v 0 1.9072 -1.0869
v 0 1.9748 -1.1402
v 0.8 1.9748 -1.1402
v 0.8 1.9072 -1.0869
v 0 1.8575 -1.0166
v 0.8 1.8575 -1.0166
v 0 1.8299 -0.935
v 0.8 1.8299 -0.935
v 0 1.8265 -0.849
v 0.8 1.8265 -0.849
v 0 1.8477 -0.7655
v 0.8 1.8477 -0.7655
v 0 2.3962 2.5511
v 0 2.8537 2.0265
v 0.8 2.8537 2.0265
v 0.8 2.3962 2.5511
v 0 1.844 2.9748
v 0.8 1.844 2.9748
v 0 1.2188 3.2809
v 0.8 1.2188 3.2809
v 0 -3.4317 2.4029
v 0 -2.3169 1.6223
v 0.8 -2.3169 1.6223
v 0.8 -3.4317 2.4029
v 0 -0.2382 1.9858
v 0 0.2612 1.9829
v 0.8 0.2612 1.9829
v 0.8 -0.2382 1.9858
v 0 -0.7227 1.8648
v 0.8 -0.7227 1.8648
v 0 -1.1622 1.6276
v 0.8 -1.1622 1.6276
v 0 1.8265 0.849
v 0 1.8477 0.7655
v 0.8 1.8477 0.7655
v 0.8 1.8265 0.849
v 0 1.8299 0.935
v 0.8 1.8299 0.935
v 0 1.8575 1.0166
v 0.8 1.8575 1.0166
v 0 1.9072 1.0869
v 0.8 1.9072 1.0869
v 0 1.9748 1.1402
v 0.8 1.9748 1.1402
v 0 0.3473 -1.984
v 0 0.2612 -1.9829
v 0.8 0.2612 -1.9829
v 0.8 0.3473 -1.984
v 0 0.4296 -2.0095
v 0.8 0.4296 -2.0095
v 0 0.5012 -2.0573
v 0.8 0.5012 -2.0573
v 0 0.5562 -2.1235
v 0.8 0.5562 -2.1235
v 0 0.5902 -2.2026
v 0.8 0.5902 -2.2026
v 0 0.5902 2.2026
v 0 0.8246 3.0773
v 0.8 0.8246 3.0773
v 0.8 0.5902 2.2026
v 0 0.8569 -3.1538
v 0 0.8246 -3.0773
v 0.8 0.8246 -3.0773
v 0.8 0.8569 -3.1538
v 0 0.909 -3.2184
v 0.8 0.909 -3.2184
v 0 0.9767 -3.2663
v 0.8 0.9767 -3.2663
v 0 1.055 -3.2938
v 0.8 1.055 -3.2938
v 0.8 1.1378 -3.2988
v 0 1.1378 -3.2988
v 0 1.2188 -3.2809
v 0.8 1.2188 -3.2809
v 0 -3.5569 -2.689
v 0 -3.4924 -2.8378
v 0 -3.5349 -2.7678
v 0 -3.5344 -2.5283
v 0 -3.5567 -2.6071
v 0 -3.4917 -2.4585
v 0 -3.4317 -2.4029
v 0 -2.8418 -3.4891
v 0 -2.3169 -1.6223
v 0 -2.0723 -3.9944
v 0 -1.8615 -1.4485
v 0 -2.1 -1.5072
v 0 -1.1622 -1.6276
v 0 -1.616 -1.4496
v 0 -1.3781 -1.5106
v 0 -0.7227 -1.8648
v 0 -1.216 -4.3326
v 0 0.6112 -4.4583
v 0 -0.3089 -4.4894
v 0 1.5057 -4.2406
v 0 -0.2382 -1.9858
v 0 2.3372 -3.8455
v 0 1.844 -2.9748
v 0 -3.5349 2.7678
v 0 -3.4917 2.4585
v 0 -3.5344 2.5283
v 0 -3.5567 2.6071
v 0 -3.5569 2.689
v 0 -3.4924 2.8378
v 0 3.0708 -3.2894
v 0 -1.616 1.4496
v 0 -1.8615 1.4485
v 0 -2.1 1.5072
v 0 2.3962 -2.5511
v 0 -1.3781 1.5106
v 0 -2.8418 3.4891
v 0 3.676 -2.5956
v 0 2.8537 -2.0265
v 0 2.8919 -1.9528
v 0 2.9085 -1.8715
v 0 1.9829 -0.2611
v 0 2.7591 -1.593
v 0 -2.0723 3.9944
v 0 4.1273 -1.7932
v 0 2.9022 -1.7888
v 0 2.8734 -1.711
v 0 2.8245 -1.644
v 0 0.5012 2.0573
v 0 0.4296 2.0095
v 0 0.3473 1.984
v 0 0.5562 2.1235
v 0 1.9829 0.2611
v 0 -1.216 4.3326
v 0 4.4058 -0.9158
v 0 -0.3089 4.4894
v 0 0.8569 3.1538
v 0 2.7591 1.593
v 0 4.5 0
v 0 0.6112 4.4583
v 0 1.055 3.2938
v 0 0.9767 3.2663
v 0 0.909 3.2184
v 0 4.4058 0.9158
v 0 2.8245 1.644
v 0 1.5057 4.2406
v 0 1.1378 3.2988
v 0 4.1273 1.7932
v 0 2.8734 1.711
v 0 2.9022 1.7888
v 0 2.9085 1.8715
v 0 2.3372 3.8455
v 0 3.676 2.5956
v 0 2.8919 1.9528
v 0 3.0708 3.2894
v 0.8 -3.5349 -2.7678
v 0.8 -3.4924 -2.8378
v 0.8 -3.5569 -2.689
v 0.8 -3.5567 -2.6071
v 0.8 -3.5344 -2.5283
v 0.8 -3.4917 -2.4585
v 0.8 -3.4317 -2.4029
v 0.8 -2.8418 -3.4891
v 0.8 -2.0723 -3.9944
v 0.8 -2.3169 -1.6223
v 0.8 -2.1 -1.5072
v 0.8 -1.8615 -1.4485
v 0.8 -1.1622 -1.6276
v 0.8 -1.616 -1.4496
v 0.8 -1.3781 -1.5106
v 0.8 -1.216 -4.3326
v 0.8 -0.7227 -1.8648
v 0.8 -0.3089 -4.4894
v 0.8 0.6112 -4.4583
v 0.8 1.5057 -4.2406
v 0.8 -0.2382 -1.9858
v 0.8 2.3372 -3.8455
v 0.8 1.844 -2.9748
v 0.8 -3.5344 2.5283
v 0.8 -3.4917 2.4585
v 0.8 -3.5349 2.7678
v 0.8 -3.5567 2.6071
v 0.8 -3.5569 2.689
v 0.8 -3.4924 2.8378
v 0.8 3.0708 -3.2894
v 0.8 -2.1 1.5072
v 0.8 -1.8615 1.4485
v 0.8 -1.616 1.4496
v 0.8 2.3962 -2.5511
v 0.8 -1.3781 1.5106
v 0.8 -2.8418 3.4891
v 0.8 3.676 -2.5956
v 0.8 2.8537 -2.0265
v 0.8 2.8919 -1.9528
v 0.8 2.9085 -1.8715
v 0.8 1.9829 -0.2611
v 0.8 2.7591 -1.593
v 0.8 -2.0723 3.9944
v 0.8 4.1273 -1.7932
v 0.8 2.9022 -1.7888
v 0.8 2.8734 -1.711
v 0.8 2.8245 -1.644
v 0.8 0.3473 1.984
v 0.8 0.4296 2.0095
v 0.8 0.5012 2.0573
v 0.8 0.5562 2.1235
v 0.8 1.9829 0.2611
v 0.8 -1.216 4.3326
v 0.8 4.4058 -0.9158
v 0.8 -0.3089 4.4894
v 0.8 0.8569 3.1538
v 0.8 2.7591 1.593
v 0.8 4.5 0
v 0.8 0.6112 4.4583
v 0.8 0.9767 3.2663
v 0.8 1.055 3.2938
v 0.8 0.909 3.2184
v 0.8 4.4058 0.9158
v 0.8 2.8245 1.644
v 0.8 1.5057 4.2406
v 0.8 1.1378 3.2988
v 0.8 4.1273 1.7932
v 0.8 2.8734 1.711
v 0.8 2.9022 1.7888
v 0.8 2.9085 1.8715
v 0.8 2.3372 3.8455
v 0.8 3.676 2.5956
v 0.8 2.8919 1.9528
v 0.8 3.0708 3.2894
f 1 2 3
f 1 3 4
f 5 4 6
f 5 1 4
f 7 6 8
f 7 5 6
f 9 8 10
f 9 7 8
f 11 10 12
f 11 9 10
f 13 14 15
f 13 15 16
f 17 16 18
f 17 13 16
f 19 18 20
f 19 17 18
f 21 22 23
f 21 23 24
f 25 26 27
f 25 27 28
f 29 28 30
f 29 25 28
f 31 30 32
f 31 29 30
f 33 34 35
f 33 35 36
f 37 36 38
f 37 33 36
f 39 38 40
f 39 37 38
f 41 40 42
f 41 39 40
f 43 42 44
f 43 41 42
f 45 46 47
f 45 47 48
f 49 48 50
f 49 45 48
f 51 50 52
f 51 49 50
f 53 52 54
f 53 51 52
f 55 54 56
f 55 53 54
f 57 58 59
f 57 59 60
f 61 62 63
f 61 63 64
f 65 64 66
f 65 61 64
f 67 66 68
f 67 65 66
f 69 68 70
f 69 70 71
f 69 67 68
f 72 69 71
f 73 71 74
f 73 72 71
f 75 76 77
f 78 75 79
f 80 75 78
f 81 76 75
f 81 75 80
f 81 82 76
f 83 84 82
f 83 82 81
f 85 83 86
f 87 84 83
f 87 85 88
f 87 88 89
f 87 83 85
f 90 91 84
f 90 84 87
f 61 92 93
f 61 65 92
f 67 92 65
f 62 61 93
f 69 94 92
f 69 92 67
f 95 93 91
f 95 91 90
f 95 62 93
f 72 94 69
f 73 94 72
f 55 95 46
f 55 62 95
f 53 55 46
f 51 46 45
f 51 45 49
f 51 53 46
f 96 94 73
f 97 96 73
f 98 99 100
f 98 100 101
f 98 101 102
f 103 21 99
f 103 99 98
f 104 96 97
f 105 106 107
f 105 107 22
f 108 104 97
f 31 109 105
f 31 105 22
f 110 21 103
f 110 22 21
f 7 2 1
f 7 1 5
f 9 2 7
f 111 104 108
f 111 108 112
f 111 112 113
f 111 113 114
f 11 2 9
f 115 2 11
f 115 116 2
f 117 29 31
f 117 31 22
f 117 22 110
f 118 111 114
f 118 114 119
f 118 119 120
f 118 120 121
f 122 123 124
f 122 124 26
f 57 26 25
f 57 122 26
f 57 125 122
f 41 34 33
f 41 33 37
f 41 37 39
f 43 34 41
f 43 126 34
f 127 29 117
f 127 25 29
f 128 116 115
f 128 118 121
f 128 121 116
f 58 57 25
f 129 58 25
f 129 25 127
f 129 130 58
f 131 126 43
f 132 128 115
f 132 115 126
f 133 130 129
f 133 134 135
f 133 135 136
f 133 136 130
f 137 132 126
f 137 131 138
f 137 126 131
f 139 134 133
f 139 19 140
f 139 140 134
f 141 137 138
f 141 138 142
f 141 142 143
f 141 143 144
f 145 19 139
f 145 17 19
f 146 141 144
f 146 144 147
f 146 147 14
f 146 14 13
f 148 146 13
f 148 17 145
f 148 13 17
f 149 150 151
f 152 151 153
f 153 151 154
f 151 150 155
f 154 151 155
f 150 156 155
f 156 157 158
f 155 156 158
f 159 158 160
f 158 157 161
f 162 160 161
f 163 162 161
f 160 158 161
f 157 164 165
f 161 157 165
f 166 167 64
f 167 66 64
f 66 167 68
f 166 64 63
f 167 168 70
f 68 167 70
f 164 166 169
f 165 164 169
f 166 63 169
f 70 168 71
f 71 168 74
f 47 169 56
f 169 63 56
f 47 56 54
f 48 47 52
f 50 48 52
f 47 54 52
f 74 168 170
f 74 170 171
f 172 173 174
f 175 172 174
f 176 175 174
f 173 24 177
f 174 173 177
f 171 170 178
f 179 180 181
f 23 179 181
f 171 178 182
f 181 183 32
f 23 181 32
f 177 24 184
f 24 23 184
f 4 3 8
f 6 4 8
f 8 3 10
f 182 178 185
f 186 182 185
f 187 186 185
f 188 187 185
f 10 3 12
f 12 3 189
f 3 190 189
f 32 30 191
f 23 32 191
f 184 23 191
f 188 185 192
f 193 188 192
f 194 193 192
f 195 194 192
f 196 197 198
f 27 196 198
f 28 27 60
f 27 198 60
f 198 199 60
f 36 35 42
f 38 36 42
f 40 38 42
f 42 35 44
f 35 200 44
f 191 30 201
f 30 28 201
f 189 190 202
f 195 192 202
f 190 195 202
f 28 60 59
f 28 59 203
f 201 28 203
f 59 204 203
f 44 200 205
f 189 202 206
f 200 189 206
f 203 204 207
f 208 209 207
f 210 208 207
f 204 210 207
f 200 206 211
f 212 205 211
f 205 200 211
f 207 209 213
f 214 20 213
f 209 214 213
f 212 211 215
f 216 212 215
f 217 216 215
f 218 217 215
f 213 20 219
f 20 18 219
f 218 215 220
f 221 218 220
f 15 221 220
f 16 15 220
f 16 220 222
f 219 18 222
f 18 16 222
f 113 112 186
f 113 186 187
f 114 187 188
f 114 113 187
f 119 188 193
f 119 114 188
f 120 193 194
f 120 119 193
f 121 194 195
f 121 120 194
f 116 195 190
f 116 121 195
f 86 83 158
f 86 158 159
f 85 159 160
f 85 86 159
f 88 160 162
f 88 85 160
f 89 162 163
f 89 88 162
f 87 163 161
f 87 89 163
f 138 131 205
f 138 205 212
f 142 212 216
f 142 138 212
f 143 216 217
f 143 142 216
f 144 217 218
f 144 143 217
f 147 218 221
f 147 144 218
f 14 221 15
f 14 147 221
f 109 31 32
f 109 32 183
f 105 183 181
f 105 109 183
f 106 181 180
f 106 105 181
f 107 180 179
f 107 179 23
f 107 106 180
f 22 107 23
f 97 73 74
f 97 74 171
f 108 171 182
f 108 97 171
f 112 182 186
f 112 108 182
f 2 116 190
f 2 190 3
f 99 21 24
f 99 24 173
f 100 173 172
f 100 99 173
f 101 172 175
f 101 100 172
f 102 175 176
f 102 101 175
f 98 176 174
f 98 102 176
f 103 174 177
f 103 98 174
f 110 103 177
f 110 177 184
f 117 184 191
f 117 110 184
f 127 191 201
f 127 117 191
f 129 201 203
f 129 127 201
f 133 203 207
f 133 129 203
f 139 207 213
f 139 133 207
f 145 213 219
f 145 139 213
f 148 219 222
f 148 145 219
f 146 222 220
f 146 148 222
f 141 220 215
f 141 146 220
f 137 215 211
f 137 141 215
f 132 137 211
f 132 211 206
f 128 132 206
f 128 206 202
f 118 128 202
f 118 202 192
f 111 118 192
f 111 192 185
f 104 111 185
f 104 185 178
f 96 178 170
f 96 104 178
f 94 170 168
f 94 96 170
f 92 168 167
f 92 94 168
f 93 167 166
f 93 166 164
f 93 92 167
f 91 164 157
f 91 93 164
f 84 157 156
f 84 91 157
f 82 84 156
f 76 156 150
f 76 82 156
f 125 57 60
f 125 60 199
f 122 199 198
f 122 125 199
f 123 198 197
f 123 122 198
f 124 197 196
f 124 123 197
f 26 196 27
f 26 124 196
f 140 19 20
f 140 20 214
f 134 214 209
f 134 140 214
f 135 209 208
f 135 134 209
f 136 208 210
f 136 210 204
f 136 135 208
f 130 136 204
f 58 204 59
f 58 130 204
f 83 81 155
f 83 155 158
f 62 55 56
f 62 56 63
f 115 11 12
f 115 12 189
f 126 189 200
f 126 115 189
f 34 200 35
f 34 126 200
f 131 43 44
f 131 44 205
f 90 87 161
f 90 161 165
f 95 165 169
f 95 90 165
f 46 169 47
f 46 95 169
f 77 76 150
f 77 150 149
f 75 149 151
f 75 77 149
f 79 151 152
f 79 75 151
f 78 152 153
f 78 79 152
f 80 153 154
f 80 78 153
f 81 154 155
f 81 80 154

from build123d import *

# Parameters (mm, degrees)
EXTRUDE_1_DEPTH = 0.8


with BuildPart() as part:
    # 草图1 → 凸台-拉伸1 (new body)
    with BuildSketch(Plane(origin=(0, 0, 0), x_dir=(0, 0, -1), z_dir=(1, 0, 0))):
        with BuildLine():
            Line((-1.622319151, -2.316911861), (-2.402867712, -3.431650734))
            ThreePointArc((-2.402867712, -3.431650734), (-2.607110405, -3.556693113), (-2.837799992, -3.492404789))
            ThreePointArc((-2.837799992, -3.492404789), (0, 4.5), (2.837799992, -3.492404789))
            ThreePointArc((2.837799992, -3.492404789), (2.607110405, -3.556693113), (2.402867712, -3.431650734))
            Line((2.402867712, -3.431650734), (1.622319151, -2.316911861))
            ThreePointArc((1.622319151, -2.316911861), (1.441481842, -1.738720971), (1.627647463, -1.162223617))
            ThreePointArc((1.627647463, -1.162223617), (1.9404922, -0.484241696), (1.982865646, 0.261235201))
            ThreePointArc((1.982865646, 0.261235201), (2.030846926, 0.467080052), (2.202649779, 0.59019823))
            Line((2.202649779, 0.59019823), (3.077349334, 0.824573269))
            ThreePointArc((3.077349334, 0.824573269), (3.266264026, 0.97670818), (3.280925835, 1.218821425))
            ThreePointArc((3.280925835, 1.218821425), (2.776736691, 2.130665002), (2.026457183, 2.853676801))
            ThreePointArc((2.026457183, 2.853676801), (1.788798992, 2.902178099), (1.592953232, 2.759075932))
            Line((1.592953232, 2.759075932), (1.140175425, 1.974841766))
            ThreePointArc((1.140175425, 1.974841766), (0.976786548, 1.840758282), (0.765537221, 1.847688492))
            ThreePointArc((0.765537221, 1.847688492), (0, 2), (-0.765537221, 1.847688492))
            ThreePointArc((-0.765537221, 1.847688492), (-0.976786548, 1.840758282), (-1.140175425, 1.974841766))
            Line((-1.140175425, 1.974841766), (-1.592953232, 2.759075932))
            ThreePointArc((-1.592953232, 2.759075932), (-1.788798992, 2.902178099), (-2.026457183, 2.853676801))
            ThreePointArc((-2.026457183, 2.853676801), (-2.776736691, 2.130665002), (-3.280925835, 1.218821425))
            ThreePointArc((-3.280925835, 1.218821425), (-3.266264026, 0.97670818), (-3.077349334, 0.824573269))
            Line((-3.077349334, 0.824573269), (-2.202649779, 0.59019823))
            ThreePointArc((-2.202649779, 0.59019823), (-2.030846926, 0.467080052), (-1.982865646, 0.261235201))
            ThreePointArc((-1.982865646, 0.261235201), (-1.9404922, -0.484241696), (-1.627647463, -1.162223617))
            ThreePointArc((-1.627647463, -1.162223617), (-1.441481842, -1.738720971), (-1.622319151, -2.316911861))
        make_face()
    extrude(amount=EXTRUDE_1_DEPTH)


solid = part.part
